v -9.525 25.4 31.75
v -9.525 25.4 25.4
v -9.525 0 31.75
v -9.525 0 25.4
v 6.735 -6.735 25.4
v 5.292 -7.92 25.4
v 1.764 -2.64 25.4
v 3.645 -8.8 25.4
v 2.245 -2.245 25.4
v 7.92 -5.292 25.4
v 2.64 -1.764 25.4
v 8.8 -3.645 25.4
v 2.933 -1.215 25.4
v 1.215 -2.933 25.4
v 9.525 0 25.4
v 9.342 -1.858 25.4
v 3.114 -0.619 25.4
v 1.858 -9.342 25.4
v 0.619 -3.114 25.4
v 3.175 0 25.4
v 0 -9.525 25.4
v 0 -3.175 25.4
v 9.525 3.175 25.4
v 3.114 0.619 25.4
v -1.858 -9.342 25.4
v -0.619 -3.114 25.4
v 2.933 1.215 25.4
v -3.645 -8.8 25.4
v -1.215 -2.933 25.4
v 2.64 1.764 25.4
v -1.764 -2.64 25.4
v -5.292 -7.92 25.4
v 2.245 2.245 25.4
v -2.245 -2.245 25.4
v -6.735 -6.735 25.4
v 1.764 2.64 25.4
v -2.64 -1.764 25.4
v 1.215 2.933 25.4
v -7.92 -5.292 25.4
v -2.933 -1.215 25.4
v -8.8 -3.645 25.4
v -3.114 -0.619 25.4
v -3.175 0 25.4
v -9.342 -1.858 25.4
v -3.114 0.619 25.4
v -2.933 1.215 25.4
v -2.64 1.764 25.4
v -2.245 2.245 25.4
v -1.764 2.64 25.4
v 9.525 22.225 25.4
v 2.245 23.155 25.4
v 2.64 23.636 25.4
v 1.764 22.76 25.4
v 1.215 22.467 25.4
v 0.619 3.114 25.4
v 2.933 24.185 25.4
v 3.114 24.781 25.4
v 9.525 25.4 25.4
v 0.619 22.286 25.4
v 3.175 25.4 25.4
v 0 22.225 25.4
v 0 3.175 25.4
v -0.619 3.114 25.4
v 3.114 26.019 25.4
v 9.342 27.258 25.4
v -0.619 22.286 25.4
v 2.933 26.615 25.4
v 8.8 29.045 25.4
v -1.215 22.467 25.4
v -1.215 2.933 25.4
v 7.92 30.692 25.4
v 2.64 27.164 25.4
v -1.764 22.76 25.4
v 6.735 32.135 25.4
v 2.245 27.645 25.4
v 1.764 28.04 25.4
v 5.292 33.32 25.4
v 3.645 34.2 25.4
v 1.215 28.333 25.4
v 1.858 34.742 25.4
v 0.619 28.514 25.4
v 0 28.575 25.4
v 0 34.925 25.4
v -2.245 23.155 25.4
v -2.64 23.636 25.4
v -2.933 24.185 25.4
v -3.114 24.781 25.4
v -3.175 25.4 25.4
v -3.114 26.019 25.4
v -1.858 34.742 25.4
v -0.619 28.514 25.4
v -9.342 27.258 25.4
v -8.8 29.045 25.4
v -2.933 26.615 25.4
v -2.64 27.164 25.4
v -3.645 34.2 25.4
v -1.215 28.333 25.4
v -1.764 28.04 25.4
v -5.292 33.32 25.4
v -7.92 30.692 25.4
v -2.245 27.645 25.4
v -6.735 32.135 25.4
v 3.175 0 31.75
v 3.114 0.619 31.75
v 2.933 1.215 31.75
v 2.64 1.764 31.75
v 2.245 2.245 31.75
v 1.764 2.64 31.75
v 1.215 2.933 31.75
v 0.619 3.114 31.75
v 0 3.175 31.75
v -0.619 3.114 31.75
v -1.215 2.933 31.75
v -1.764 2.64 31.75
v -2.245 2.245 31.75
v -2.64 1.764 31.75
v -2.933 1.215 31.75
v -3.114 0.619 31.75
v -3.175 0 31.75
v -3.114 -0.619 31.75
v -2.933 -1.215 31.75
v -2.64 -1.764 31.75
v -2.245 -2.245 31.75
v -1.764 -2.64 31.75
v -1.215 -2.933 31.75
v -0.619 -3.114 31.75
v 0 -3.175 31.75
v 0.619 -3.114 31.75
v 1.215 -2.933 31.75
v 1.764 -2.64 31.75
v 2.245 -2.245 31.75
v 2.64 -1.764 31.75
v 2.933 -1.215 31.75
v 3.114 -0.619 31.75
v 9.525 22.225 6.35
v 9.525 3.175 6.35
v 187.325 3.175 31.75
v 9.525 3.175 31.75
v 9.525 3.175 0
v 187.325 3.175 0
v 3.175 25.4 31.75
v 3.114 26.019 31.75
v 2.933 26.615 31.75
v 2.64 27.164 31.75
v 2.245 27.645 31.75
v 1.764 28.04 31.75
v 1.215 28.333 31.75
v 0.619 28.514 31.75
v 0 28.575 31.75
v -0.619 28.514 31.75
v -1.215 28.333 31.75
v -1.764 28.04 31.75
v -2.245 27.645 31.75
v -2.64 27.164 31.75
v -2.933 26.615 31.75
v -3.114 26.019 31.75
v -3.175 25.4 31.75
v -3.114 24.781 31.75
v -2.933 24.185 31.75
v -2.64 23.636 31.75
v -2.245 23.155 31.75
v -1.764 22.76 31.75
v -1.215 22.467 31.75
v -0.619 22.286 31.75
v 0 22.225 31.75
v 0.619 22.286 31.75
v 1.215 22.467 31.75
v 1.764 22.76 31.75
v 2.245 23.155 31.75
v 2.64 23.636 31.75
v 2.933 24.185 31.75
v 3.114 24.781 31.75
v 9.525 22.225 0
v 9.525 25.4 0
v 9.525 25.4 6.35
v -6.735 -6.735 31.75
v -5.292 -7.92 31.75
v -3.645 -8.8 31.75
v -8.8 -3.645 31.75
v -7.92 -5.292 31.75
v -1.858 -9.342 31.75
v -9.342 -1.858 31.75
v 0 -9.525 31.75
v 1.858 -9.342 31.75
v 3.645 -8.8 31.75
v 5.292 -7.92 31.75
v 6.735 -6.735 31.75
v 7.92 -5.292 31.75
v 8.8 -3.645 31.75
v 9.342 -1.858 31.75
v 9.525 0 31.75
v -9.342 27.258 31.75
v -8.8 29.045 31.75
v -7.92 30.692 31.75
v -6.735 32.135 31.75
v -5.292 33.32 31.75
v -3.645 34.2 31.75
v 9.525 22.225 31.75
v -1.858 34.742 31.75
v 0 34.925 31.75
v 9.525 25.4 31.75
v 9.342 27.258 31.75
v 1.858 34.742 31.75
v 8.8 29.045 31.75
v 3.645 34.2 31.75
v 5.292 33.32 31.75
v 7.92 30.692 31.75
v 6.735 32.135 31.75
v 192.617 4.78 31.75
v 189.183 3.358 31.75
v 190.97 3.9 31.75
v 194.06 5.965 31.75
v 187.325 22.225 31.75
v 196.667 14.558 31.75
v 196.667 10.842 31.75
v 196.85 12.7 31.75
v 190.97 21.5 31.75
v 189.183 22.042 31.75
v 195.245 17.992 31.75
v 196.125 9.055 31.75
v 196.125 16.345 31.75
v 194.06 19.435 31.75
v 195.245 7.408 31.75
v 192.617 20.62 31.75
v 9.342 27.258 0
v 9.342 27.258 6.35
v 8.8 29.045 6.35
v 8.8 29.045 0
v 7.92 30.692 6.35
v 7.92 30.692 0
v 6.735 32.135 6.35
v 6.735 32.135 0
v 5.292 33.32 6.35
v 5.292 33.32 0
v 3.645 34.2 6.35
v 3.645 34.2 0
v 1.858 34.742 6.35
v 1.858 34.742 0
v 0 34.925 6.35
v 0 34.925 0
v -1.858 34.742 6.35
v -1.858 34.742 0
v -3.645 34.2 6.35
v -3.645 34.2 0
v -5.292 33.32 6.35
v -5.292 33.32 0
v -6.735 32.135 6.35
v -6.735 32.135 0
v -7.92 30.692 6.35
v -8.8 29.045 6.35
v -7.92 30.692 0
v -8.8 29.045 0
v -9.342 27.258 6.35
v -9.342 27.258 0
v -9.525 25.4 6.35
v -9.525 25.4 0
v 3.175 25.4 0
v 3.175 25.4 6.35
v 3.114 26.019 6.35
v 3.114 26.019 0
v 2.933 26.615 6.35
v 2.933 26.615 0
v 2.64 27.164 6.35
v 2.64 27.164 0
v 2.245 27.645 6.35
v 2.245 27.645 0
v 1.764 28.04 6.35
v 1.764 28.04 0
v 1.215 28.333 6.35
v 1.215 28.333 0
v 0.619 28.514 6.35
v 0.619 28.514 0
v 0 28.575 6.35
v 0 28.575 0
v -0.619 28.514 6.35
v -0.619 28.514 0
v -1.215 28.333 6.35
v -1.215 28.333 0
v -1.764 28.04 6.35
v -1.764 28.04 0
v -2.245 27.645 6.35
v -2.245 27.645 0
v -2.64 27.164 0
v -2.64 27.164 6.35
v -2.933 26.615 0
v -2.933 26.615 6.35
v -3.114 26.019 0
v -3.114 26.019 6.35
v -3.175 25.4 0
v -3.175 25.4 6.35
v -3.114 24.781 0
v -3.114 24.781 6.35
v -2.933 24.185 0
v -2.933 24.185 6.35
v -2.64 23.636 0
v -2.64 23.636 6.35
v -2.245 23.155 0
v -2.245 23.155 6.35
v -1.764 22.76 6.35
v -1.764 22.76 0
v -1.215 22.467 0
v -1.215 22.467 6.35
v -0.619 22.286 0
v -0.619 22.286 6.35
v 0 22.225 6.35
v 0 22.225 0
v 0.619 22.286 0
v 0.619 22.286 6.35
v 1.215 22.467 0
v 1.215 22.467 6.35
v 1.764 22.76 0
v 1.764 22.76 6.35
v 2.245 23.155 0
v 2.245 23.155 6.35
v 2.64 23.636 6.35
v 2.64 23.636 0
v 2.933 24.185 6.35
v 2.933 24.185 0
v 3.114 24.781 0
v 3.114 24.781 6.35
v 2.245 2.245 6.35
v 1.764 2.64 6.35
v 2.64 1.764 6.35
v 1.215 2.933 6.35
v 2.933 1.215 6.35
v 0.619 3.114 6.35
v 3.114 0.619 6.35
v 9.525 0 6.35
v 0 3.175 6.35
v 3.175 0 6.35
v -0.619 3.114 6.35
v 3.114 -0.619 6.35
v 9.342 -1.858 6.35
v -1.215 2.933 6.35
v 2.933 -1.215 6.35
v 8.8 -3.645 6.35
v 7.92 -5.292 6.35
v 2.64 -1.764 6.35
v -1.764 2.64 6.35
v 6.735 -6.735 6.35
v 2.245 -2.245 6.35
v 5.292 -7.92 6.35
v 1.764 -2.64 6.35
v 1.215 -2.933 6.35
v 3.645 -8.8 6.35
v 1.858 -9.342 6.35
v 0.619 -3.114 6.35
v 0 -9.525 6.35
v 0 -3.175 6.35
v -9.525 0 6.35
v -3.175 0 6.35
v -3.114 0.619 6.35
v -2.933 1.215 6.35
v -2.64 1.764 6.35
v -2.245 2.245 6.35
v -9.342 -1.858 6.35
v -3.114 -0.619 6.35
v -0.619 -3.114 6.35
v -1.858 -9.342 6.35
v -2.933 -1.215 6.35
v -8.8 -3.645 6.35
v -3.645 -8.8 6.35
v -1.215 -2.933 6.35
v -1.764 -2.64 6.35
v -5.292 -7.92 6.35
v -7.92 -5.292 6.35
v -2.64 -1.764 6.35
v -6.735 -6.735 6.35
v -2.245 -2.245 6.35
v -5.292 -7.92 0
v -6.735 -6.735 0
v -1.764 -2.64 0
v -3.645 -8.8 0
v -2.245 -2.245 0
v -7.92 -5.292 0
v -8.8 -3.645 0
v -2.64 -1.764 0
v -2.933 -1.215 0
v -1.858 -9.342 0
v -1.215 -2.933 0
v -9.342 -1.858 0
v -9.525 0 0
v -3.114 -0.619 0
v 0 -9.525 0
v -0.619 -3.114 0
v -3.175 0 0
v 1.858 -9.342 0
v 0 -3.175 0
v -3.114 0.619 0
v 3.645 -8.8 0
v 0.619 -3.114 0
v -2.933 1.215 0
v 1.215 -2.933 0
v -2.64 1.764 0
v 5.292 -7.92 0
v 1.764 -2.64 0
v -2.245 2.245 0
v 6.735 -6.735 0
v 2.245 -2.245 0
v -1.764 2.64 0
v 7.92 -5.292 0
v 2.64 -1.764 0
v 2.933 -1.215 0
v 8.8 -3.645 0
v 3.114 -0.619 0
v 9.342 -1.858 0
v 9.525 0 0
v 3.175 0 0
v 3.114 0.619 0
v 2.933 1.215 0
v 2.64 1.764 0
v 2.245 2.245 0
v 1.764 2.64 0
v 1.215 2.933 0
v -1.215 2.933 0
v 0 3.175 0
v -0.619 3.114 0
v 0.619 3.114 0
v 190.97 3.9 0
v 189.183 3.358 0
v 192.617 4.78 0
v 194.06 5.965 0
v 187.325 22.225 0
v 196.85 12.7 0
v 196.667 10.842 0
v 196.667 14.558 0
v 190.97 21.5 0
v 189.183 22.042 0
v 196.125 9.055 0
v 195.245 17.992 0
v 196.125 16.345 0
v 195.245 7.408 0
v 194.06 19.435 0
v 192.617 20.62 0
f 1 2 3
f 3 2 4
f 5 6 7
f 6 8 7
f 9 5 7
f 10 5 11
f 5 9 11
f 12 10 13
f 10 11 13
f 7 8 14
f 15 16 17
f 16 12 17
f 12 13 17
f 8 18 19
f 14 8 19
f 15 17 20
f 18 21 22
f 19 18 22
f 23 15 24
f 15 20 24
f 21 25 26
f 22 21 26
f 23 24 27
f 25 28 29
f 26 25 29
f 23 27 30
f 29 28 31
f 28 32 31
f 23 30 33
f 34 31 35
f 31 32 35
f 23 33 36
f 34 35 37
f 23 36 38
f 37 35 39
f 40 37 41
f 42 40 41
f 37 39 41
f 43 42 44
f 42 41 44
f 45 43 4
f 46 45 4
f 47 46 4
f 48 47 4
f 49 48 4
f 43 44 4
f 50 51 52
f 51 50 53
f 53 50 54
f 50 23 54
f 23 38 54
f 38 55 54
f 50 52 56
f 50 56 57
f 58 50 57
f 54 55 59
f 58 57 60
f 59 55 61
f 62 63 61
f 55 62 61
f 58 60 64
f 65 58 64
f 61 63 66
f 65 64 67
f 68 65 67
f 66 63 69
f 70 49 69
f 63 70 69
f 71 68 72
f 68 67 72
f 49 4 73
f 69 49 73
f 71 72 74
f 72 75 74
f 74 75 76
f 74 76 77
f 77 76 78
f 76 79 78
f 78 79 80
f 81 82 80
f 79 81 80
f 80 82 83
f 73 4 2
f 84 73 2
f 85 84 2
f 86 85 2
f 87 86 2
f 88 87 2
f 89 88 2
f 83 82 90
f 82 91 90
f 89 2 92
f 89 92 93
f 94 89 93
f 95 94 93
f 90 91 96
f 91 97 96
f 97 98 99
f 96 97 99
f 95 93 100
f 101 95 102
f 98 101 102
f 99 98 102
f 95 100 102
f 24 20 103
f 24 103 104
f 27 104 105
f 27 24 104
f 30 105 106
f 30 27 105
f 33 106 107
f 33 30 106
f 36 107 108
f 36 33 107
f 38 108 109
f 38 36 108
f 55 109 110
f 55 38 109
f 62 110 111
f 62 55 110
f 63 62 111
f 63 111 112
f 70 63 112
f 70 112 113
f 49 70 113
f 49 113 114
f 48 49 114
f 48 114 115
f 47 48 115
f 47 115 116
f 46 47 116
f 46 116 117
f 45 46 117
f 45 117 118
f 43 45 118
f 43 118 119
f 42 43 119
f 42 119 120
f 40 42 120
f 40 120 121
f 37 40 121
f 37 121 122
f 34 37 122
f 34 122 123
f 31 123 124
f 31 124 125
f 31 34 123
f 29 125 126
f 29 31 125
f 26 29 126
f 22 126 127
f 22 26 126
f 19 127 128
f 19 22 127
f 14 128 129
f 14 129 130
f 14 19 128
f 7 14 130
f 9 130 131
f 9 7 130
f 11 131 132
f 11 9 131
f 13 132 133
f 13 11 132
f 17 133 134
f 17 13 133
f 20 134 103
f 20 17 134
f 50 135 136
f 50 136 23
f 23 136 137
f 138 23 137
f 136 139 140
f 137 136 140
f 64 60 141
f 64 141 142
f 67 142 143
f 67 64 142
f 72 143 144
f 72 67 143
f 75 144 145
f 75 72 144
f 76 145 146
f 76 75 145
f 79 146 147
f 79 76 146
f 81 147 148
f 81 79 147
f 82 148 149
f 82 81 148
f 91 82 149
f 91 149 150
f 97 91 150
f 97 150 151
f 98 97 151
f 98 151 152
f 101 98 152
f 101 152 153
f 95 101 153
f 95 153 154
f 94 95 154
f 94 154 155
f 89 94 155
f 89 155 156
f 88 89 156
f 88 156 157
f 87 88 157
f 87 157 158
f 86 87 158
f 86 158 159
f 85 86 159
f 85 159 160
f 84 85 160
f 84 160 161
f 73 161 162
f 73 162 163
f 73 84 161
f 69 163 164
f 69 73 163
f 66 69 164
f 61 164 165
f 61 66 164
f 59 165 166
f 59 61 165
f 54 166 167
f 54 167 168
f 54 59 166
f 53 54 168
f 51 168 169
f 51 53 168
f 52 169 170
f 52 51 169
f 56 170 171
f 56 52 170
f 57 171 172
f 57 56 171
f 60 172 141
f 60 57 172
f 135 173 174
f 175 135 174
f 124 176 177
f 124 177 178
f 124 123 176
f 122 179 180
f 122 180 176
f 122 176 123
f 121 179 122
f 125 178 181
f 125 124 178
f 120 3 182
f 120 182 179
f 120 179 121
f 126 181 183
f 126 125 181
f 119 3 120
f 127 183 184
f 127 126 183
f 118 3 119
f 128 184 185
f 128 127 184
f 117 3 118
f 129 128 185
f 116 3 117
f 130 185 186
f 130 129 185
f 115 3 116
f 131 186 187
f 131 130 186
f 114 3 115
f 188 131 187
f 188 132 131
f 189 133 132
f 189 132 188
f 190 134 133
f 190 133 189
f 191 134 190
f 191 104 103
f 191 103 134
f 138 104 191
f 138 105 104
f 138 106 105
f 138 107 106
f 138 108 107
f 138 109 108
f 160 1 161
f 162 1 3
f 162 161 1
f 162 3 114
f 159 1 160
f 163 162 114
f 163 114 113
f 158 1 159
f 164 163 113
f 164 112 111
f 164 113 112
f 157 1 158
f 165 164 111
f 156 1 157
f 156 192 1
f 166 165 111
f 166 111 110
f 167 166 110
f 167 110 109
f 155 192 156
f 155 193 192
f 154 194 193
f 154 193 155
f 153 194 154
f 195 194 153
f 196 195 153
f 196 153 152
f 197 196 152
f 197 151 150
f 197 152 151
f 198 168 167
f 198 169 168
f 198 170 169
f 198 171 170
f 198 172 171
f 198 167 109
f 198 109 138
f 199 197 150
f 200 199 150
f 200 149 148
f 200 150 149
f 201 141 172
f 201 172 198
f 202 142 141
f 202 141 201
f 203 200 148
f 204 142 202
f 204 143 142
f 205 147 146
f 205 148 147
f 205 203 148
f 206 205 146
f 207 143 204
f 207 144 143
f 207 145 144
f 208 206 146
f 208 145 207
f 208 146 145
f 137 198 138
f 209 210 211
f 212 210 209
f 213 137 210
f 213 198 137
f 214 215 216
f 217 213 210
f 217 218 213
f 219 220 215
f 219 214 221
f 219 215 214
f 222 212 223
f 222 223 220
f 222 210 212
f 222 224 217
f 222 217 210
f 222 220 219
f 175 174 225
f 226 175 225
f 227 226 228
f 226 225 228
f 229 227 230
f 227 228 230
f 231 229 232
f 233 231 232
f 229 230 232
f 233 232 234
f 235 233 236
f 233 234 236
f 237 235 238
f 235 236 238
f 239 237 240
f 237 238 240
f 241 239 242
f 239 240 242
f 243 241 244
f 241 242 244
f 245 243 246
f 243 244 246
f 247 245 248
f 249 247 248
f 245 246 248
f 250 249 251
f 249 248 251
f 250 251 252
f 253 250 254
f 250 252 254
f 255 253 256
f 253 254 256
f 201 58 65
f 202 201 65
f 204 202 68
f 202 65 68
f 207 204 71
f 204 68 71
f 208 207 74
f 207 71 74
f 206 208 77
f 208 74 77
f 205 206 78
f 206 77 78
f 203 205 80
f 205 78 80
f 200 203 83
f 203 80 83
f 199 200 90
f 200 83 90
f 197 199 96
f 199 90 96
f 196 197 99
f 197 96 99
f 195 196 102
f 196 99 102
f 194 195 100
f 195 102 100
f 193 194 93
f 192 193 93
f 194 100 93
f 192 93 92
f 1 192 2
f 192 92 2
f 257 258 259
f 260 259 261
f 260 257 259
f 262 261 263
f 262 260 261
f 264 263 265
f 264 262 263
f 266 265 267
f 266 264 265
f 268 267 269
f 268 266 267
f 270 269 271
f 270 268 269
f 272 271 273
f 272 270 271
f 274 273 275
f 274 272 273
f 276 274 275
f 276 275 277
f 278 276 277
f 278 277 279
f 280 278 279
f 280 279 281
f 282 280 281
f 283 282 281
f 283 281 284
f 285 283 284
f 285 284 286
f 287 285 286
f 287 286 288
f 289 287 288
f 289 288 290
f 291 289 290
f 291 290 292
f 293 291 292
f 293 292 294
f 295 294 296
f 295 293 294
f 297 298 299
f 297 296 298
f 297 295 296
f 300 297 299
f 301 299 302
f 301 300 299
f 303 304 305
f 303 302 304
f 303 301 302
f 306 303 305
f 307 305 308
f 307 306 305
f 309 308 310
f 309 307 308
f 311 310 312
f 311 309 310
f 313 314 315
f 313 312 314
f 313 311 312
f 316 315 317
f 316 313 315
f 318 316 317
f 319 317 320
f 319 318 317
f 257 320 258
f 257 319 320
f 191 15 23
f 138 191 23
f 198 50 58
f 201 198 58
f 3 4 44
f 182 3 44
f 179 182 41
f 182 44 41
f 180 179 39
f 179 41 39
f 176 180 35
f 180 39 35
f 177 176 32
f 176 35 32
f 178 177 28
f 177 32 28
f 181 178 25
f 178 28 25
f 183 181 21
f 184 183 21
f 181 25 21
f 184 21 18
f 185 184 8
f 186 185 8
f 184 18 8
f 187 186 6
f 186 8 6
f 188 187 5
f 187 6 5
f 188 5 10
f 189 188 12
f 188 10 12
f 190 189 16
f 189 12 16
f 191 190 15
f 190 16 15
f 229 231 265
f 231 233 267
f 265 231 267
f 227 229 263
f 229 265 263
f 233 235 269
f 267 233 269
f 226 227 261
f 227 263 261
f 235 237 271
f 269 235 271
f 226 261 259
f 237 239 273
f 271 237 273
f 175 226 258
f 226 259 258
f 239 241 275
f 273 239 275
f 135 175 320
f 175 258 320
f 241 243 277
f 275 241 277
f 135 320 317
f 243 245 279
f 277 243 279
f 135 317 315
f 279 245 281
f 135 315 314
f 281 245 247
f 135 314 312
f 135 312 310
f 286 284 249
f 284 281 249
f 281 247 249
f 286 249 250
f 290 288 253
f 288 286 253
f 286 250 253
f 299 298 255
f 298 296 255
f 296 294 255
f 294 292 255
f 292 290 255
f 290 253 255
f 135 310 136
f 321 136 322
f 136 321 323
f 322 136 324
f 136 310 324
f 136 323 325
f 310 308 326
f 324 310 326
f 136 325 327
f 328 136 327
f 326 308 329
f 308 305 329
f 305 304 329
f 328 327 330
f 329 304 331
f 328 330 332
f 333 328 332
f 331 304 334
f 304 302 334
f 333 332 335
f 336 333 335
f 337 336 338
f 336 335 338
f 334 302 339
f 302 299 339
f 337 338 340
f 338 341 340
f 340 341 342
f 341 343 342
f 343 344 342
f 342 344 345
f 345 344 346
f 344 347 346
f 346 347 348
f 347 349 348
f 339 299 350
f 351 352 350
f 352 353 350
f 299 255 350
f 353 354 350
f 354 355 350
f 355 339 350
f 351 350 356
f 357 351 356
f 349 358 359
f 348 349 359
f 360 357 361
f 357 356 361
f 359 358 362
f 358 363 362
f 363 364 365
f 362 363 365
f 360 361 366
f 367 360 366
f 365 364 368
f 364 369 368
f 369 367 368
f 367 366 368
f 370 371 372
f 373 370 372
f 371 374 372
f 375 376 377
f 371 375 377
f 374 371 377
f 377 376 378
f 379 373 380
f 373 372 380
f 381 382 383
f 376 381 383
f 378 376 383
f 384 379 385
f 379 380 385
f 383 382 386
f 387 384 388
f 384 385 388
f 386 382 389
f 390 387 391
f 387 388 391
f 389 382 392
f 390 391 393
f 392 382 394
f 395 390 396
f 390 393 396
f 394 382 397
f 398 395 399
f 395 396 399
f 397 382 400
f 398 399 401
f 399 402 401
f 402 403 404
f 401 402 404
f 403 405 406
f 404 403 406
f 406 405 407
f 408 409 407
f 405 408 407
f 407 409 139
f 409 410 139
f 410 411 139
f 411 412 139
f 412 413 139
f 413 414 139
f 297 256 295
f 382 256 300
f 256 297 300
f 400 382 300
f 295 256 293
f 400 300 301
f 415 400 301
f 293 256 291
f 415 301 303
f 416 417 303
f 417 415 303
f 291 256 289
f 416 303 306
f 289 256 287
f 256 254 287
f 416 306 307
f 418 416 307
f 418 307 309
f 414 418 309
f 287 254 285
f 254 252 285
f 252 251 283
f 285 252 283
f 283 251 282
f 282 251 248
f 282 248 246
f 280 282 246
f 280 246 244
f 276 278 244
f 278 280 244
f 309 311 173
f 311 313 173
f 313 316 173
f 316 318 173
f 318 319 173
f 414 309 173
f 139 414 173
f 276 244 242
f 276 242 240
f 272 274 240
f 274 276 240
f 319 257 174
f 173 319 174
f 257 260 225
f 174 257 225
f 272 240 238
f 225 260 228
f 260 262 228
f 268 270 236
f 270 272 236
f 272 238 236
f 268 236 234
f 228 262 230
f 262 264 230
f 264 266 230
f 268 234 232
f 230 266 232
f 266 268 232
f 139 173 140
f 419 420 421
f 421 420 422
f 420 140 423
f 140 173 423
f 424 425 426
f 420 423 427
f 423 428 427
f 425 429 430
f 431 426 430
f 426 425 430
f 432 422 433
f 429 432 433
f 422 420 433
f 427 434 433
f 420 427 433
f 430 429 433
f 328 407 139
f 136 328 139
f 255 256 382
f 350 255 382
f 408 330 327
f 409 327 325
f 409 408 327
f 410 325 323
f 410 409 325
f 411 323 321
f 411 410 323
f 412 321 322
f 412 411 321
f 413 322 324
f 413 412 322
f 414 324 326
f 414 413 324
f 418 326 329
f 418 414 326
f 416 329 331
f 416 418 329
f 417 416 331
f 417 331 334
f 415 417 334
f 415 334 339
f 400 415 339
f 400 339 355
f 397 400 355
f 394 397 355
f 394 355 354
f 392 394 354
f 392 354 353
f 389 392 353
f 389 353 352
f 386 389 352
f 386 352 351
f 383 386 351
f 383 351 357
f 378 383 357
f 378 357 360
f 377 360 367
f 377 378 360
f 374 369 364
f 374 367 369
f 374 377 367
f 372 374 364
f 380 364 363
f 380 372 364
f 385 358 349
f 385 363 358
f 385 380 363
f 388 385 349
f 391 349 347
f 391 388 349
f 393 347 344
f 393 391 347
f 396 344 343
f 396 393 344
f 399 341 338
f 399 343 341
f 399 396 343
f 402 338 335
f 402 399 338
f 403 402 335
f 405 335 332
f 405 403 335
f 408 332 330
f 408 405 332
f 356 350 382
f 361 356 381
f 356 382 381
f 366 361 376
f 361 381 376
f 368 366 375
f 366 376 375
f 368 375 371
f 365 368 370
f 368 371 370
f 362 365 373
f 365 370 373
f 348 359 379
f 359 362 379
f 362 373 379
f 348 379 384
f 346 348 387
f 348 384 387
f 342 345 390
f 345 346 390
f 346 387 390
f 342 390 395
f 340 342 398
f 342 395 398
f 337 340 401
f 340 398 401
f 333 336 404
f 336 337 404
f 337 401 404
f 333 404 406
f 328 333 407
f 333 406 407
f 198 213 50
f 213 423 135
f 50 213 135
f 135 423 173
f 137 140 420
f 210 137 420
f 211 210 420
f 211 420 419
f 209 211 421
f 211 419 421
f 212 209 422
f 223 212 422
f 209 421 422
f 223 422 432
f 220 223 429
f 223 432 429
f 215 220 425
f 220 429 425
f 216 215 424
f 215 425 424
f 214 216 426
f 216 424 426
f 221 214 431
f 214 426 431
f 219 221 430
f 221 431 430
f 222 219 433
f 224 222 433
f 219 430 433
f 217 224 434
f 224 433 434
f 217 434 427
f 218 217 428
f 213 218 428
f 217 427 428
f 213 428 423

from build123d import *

# Parameters (mm, degrees)
SKETCH1_R           = 3.175
BOSS_EXTRUDE1_DEPTH = 31.75
SKETCH2_W           = 19.05
SKETCH2_H           = 25.4
SKETCH2_H_2         = 9.525
CUT_EXTRUDE1_DEPTH  = 19.05


with BuildPart() as part:
    # Sketch1 → Boss-Extrude1 (new body)
    with BuildSketch(Plane.XY):
        with BuildLine():
            Line((-9.525, 25.4), (-9.525, 0))
            ThreePointArc((-9.525, 0), (0, -9.525), (9.525, 0))
            Line((9.525, 0), (9.525, 3.175))
            Line((9.525, 3.175), (187.325, 3.175))
            ThreePointArc((187.325, 3.175), (196.85, 12.7), (187.325, 22.225))
            Line((187.325, 22.225), (9.525, 22.225))
            Line((9.525, 22.225), (9.525, 25.4))
            ThreePointArc((9.525, 25.4), (0, 34.925), (-9.525, 25.4))
        make_face()
        Circle(SKETCH1_R, mode=Mode.SUBTRACT)
        with Locations((0, 25.4)):
            Circle(SKETCH1_R, mode=Mode.SUBTRACT)
    extrude(amount=BOSS_EXTRUDE1_DEPTH)

    # Sketch2 → Cut-Extrude1 (cut)
    with BuildSketch(Plane.ZY.offset(9.525)):
        with Locations((15.875, 12.7)):
            Rectangle(SKETCH2_W, SKETCH2_H)
        with Locations((15.875, 30.1625)):
            Rectangle(SKETCH2_W, SKETCH2_H_2)
        with Locations((15.875, -4.7625)):
            Rectangle(SKETCH2_W, SKETCH2_H_2)
    extrude(amount=-CUT_EXTRUDE1_DEPTH, mode=Mode.SUBTRACT)


solid = part.part
